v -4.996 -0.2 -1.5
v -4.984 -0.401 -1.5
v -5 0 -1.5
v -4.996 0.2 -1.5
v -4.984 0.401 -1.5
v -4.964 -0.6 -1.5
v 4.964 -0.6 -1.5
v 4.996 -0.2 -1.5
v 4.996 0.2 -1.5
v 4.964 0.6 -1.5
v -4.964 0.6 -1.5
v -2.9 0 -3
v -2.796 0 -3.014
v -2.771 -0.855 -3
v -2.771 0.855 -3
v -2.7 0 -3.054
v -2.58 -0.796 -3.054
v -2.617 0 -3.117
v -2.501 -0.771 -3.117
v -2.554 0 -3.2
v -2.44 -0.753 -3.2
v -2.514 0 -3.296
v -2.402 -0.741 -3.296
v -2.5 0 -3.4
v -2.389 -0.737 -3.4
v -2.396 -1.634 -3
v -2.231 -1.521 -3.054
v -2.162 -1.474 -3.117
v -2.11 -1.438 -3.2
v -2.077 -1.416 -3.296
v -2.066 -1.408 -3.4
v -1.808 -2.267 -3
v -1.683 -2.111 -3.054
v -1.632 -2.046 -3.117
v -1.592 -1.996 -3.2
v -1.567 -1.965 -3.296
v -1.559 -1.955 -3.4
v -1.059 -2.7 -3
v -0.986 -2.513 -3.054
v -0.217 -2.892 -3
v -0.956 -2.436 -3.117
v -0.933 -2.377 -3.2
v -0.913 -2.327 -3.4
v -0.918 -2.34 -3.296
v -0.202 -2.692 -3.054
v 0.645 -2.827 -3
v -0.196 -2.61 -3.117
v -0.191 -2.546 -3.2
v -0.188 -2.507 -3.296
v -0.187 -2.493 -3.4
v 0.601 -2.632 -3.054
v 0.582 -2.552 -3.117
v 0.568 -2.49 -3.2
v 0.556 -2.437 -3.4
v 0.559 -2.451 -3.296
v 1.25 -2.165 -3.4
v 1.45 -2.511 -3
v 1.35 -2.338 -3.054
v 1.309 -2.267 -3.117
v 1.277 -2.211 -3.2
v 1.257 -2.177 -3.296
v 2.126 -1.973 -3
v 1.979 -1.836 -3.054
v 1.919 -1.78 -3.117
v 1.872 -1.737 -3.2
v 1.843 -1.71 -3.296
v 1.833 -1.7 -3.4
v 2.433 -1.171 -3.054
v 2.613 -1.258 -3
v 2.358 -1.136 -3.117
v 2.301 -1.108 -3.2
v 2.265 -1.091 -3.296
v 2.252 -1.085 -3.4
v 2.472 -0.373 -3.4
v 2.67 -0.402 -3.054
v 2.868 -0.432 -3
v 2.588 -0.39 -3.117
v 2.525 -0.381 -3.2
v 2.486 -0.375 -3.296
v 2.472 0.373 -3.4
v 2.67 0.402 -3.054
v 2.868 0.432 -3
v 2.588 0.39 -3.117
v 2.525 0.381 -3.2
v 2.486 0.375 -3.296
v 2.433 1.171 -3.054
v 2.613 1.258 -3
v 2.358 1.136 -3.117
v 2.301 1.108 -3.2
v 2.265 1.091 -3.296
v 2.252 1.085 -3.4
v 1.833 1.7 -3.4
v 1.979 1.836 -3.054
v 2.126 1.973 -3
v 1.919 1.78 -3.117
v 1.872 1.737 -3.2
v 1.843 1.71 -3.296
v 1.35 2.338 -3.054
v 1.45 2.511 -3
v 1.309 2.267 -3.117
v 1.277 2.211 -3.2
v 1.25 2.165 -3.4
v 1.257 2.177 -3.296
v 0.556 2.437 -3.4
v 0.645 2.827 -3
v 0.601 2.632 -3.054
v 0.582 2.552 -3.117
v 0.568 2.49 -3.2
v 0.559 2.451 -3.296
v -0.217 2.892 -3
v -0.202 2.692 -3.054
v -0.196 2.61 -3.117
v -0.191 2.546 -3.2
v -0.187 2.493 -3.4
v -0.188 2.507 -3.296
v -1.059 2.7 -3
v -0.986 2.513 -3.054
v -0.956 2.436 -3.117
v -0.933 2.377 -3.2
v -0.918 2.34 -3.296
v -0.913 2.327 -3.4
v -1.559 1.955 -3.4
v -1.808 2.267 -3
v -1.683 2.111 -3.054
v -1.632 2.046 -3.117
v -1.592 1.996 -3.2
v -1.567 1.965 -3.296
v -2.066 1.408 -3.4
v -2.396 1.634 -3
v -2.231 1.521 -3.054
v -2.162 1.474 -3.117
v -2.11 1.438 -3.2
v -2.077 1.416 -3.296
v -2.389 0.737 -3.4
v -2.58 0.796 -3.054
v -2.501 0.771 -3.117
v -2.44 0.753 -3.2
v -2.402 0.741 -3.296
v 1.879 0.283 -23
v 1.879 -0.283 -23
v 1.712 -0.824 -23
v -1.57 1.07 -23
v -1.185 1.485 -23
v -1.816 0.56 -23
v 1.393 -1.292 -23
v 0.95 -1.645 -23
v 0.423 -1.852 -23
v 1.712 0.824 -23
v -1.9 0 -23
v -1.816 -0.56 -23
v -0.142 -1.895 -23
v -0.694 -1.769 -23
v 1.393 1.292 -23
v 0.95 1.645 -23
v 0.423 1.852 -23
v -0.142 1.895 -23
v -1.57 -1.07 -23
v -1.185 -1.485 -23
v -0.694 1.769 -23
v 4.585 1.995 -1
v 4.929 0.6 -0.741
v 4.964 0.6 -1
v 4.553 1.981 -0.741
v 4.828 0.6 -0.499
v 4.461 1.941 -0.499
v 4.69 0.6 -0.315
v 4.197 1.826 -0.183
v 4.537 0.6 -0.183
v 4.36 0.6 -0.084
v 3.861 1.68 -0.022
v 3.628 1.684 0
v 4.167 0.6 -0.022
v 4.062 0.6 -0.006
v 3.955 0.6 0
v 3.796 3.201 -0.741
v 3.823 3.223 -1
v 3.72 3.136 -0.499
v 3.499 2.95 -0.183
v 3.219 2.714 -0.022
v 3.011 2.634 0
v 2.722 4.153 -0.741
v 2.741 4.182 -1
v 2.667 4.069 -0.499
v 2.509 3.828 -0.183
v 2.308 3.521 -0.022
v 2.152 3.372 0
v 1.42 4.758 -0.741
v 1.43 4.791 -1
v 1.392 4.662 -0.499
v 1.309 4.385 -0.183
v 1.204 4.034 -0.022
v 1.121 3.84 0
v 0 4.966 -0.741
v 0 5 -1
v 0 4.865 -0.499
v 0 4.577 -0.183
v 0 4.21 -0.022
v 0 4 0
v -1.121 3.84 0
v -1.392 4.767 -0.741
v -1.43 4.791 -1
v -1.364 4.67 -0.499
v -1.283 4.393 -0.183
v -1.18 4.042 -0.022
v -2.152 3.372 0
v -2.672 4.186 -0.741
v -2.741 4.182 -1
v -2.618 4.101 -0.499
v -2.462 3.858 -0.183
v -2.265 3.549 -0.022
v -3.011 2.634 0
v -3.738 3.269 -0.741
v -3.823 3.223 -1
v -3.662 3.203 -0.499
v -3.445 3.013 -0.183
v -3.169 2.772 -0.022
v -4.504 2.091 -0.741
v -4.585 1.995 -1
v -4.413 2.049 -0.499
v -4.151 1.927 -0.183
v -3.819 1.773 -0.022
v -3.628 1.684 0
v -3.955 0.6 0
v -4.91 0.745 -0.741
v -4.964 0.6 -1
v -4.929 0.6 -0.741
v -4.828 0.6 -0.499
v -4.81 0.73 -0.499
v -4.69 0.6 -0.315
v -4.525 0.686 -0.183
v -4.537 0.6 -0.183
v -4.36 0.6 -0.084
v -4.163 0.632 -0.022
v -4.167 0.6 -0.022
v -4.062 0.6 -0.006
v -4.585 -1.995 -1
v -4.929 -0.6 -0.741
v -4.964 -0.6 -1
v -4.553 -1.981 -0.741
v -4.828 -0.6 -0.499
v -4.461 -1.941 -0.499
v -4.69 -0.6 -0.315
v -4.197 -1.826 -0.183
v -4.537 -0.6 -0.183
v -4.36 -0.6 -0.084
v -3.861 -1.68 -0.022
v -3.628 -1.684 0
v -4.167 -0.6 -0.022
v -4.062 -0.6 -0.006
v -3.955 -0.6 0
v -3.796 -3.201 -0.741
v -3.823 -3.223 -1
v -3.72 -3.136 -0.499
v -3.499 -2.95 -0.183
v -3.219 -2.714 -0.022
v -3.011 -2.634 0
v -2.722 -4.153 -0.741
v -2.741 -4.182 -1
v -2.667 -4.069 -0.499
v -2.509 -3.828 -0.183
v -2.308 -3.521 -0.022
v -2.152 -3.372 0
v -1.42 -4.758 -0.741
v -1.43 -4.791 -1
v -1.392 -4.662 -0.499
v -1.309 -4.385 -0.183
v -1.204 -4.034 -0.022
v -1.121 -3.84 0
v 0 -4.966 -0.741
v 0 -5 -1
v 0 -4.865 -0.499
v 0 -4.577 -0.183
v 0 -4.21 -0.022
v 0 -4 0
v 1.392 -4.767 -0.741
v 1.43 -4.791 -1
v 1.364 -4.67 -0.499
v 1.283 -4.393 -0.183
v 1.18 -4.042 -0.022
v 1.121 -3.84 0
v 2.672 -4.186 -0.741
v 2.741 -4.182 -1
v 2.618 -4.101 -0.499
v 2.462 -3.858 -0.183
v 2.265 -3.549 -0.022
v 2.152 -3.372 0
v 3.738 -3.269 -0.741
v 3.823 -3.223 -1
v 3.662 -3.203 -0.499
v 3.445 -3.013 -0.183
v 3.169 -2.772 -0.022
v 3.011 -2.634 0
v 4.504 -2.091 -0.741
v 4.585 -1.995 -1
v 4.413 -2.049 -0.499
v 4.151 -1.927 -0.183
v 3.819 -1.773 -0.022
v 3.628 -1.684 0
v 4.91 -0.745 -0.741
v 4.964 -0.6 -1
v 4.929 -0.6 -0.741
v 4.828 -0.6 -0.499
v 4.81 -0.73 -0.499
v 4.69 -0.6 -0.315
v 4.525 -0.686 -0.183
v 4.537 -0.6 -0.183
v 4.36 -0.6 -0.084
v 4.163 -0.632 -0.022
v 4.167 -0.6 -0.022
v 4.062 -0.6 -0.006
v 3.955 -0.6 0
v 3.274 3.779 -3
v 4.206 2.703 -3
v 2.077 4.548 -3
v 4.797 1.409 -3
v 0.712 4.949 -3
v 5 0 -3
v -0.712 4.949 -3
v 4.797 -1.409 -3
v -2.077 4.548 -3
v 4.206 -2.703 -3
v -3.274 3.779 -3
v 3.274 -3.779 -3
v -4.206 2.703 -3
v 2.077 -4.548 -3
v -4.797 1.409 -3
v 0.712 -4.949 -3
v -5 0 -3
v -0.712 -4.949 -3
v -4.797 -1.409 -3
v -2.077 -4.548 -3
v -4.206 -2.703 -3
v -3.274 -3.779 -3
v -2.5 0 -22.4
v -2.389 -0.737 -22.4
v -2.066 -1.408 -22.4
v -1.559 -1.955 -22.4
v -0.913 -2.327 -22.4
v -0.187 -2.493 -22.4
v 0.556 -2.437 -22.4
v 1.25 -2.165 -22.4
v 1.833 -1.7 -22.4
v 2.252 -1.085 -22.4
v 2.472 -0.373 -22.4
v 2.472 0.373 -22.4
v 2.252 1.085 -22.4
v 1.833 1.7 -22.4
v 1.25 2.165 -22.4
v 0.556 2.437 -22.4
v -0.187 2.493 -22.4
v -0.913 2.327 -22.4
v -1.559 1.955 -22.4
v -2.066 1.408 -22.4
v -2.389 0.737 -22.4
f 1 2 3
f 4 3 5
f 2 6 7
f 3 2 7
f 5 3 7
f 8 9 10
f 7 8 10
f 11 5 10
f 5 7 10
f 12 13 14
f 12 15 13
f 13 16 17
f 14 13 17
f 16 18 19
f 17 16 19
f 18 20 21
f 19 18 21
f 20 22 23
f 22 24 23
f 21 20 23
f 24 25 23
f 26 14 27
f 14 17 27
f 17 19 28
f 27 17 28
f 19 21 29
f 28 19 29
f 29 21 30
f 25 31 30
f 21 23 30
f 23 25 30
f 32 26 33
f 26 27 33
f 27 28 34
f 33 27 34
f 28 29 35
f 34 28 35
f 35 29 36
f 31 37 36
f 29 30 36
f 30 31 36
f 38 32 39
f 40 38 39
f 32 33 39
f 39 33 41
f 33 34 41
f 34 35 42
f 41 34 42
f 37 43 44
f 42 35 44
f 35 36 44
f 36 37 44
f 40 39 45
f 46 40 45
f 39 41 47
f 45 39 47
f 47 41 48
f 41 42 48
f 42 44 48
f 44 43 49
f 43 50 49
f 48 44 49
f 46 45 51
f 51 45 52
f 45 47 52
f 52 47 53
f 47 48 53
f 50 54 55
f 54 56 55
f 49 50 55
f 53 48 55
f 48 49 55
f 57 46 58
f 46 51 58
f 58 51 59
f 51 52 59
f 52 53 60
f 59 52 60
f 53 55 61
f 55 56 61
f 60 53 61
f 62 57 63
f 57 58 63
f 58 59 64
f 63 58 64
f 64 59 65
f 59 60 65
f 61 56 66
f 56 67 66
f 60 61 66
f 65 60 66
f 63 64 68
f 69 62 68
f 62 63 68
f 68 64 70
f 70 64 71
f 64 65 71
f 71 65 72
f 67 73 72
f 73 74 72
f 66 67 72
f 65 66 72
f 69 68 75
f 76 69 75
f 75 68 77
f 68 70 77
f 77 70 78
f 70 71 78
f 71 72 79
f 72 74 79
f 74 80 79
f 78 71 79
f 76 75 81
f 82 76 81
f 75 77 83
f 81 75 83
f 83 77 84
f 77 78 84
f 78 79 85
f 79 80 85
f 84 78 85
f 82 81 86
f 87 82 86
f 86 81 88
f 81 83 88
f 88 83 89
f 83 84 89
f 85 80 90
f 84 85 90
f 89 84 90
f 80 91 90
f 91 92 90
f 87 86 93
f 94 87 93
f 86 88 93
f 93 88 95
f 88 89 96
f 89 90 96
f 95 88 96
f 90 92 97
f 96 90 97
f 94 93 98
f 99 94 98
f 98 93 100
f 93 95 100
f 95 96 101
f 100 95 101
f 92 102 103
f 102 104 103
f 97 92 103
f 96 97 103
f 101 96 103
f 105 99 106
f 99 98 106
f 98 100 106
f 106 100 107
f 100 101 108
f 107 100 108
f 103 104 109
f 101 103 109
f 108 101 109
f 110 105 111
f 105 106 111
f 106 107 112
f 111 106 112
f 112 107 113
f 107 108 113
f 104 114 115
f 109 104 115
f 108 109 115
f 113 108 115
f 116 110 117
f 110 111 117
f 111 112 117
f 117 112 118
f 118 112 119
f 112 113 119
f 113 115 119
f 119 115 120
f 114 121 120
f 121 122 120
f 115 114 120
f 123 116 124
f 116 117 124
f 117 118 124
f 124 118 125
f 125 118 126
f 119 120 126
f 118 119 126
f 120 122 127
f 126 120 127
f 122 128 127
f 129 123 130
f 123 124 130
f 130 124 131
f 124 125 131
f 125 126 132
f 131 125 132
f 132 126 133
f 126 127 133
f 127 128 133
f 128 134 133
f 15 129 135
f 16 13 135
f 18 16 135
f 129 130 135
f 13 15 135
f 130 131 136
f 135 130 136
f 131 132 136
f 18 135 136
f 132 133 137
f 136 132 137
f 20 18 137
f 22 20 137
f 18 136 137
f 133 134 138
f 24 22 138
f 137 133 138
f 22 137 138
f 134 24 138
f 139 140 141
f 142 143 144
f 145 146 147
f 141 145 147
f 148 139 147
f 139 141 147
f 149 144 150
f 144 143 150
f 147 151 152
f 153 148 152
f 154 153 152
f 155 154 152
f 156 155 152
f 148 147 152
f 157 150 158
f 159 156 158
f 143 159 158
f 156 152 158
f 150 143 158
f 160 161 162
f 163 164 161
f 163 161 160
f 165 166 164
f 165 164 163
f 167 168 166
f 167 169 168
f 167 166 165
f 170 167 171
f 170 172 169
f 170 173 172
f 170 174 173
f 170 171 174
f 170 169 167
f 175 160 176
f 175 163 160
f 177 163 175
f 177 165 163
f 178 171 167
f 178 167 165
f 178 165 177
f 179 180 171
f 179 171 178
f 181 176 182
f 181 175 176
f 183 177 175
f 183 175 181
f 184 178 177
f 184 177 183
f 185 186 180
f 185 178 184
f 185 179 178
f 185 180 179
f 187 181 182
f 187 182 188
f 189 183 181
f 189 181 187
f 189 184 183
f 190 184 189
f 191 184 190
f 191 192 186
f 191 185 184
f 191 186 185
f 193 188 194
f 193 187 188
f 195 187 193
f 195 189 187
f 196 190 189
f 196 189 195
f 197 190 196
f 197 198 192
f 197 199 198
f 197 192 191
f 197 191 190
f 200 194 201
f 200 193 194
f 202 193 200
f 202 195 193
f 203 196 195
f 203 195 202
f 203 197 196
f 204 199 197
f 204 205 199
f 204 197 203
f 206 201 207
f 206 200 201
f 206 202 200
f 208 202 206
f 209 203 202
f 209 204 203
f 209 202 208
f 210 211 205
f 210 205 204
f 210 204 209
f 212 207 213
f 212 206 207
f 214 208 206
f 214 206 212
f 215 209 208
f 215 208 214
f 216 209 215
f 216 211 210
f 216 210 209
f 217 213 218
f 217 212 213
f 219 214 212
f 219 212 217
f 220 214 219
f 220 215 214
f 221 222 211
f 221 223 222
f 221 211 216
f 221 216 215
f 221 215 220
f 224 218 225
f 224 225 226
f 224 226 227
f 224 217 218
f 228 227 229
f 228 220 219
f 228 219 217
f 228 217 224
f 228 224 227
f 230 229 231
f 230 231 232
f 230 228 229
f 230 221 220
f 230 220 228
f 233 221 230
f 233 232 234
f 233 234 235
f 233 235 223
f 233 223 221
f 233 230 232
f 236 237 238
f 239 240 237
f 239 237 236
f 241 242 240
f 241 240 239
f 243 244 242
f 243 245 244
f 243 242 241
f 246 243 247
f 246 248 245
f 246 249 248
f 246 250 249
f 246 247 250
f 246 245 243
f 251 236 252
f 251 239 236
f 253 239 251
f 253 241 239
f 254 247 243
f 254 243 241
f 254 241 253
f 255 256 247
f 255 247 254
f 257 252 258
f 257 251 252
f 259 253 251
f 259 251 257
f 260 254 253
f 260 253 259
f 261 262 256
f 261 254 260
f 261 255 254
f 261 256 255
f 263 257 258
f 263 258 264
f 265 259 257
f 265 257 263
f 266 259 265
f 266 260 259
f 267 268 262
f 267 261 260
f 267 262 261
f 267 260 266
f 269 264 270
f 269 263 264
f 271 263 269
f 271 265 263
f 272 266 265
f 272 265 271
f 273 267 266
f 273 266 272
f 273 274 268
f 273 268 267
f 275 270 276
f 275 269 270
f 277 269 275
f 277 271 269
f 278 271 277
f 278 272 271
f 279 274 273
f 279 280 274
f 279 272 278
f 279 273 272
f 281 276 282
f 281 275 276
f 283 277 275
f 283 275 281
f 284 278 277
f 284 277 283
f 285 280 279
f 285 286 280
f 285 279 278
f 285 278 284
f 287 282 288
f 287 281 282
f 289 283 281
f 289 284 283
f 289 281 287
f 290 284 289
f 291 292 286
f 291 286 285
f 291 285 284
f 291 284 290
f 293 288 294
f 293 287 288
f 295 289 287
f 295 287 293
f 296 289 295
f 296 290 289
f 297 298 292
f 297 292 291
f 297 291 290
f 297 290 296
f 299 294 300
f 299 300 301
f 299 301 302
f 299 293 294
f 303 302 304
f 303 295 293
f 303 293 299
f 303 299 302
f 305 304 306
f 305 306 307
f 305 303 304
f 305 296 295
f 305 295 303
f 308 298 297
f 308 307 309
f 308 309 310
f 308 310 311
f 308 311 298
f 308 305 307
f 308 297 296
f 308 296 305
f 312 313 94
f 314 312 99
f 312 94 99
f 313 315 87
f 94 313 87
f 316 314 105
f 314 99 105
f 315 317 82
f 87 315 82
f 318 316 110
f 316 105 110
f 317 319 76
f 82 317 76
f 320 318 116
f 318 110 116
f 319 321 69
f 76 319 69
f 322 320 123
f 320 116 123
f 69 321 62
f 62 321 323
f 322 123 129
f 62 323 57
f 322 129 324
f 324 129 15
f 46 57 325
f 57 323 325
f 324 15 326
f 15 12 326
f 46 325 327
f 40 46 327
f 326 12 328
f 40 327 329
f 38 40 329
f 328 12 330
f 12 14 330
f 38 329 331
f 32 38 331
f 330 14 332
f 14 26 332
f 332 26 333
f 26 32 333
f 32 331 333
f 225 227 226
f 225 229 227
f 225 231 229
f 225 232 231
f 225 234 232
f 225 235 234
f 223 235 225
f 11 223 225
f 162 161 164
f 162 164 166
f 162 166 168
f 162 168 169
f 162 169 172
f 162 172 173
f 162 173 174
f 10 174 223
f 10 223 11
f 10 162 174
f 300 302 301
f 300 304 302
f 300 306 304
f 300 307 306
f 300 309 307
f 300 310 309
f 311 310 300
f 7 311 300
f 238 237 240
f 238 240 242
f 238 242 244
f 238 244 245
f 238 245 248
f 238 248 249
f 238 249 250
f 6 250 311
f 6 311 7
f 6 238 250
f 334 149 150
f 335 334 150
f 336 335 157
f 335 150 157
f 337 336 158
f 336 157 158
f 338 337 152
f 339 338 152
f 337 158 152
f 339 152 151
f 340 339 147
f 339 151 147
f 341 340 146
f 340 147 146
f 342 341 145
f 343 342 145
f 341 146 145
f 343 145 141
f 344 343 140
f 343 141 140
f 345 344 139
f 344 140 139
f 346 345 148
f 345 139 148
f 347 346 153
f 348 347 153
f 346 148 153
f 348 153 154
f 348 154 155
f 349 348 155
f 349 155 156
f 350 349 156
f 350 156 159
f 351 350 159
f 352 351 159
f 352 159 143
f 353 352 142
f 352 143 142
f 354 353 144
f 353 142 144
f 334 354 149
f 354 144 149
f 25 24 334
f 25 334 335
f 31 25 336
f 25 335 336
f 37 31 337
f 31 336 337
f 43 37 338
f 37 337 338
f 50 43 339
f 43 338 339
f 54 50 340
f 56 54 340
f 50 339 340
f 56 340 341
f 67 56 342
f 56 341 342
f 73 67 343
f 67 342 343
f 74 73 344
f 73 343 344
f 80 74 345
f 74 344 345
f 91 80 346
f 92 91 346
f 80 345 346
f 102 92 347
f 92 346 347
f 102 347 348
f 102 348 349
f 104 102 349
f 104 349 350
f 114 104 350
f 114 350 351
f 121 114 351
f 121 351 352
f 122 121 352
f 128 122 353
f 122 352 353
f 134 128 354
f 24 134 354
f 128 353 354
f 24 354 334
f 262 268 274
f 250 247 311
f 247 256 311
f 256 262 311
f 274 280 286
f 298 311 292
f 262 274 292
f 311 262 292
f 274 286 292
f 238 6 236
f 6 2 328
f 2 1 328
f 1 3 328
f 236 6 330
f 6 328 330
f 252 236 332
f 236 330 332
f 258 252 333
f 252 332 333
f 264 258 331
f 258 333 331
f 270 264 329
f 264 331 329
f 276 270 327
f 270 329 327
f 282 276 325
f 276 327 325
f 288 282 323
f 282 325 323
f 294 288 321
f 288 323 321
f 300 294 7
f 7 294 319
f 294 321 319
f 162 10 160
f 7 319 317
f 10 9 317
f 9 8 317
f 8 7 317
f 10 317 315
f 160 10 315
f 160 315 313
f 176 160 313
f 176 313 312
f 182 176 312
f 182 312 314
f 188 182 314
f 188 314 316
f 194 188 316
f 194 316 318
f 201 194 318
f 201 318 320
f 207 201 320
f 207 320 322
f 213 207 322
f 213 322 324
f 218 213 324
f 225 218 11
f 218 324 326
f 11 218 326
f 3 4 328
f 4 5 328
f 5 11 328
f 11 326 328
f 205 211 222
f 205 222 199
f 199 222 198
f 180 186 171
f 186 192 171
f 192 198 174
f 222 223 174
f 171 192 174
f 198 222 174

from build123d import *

# Parameters (mm, degrees)
SKETCH_2_W               = 1.5
SKETCH_2_H               = 1.2
CUT_EXTRUDE_1_DEPTH      = 6
CUT_EXTRUDE_1_DEPTH_BACK = 6
CHAMFER_1_SIZE           = 0.6
FILLET_1_R               = 1
FILLET_2_R               = 0.4


with BuildPart() as part:
    # Эскиз1 → Повернуть1 (revolve)
    with BuildSketch(Plane(origin=(0, 0, 0), x_dir=(1, 0, 0), z_dir=(0, 1, 0))):
        Polygon((0, 0), (-5, 0), (-5, 3), (-2.5, 3), (-2.5, 23), (0, 23), align=None)
    revolve(axis=Axis((0, 0, -23), (0, 0, 1)))

    # Эскиз2 → Вырез-Вытянуть1 (cut, two sides)
    with BuildSketch(Plane(origin=(0, 0, 0), x_dir=(0, 0, -1), z_dir=(1, 0, 0))) as cut_extrude_1_sk:
        with Locations((0.75, 0)):
            Rectangle(SKETCH_2_W, SKETCH_2_H)
    extrude(amount=CUT_EXTRUDE_1_DEPTH, mode=Mode.SUBTRACT)
    extrude(cut_extrude_1_sk.sketch, amount=-CUT_EXTRUDE_1_DEPTH_BACK, mode=Mode.SUBTRACT)

    # Фаска1
    chamfer_1_edges = [part.edges().sort_by_distance(p)[0] for p in [
        (2.5, 0, -23),
    ]]
    chamfer(chamfer_1_edges, length=CHAMFER_1_SIZE)

    # Скругление1
    fillet_1_edges = [part.edges().sort_by_distance(p)[0] for p in [
        (0, 5, 0),
        (0, -5, 0),
    ]]
    fillet(fillet_1_edges, radius=FILLET_1_R)

    # Скругление2
    fillet_2_edges = [part.edges().sort_by_distance(p)[0] for p in [
        (2.5, 0, -3),
    ]]
    fillet(fillet_2_edges, radius=FILLET_2_R)


solid = part.part
